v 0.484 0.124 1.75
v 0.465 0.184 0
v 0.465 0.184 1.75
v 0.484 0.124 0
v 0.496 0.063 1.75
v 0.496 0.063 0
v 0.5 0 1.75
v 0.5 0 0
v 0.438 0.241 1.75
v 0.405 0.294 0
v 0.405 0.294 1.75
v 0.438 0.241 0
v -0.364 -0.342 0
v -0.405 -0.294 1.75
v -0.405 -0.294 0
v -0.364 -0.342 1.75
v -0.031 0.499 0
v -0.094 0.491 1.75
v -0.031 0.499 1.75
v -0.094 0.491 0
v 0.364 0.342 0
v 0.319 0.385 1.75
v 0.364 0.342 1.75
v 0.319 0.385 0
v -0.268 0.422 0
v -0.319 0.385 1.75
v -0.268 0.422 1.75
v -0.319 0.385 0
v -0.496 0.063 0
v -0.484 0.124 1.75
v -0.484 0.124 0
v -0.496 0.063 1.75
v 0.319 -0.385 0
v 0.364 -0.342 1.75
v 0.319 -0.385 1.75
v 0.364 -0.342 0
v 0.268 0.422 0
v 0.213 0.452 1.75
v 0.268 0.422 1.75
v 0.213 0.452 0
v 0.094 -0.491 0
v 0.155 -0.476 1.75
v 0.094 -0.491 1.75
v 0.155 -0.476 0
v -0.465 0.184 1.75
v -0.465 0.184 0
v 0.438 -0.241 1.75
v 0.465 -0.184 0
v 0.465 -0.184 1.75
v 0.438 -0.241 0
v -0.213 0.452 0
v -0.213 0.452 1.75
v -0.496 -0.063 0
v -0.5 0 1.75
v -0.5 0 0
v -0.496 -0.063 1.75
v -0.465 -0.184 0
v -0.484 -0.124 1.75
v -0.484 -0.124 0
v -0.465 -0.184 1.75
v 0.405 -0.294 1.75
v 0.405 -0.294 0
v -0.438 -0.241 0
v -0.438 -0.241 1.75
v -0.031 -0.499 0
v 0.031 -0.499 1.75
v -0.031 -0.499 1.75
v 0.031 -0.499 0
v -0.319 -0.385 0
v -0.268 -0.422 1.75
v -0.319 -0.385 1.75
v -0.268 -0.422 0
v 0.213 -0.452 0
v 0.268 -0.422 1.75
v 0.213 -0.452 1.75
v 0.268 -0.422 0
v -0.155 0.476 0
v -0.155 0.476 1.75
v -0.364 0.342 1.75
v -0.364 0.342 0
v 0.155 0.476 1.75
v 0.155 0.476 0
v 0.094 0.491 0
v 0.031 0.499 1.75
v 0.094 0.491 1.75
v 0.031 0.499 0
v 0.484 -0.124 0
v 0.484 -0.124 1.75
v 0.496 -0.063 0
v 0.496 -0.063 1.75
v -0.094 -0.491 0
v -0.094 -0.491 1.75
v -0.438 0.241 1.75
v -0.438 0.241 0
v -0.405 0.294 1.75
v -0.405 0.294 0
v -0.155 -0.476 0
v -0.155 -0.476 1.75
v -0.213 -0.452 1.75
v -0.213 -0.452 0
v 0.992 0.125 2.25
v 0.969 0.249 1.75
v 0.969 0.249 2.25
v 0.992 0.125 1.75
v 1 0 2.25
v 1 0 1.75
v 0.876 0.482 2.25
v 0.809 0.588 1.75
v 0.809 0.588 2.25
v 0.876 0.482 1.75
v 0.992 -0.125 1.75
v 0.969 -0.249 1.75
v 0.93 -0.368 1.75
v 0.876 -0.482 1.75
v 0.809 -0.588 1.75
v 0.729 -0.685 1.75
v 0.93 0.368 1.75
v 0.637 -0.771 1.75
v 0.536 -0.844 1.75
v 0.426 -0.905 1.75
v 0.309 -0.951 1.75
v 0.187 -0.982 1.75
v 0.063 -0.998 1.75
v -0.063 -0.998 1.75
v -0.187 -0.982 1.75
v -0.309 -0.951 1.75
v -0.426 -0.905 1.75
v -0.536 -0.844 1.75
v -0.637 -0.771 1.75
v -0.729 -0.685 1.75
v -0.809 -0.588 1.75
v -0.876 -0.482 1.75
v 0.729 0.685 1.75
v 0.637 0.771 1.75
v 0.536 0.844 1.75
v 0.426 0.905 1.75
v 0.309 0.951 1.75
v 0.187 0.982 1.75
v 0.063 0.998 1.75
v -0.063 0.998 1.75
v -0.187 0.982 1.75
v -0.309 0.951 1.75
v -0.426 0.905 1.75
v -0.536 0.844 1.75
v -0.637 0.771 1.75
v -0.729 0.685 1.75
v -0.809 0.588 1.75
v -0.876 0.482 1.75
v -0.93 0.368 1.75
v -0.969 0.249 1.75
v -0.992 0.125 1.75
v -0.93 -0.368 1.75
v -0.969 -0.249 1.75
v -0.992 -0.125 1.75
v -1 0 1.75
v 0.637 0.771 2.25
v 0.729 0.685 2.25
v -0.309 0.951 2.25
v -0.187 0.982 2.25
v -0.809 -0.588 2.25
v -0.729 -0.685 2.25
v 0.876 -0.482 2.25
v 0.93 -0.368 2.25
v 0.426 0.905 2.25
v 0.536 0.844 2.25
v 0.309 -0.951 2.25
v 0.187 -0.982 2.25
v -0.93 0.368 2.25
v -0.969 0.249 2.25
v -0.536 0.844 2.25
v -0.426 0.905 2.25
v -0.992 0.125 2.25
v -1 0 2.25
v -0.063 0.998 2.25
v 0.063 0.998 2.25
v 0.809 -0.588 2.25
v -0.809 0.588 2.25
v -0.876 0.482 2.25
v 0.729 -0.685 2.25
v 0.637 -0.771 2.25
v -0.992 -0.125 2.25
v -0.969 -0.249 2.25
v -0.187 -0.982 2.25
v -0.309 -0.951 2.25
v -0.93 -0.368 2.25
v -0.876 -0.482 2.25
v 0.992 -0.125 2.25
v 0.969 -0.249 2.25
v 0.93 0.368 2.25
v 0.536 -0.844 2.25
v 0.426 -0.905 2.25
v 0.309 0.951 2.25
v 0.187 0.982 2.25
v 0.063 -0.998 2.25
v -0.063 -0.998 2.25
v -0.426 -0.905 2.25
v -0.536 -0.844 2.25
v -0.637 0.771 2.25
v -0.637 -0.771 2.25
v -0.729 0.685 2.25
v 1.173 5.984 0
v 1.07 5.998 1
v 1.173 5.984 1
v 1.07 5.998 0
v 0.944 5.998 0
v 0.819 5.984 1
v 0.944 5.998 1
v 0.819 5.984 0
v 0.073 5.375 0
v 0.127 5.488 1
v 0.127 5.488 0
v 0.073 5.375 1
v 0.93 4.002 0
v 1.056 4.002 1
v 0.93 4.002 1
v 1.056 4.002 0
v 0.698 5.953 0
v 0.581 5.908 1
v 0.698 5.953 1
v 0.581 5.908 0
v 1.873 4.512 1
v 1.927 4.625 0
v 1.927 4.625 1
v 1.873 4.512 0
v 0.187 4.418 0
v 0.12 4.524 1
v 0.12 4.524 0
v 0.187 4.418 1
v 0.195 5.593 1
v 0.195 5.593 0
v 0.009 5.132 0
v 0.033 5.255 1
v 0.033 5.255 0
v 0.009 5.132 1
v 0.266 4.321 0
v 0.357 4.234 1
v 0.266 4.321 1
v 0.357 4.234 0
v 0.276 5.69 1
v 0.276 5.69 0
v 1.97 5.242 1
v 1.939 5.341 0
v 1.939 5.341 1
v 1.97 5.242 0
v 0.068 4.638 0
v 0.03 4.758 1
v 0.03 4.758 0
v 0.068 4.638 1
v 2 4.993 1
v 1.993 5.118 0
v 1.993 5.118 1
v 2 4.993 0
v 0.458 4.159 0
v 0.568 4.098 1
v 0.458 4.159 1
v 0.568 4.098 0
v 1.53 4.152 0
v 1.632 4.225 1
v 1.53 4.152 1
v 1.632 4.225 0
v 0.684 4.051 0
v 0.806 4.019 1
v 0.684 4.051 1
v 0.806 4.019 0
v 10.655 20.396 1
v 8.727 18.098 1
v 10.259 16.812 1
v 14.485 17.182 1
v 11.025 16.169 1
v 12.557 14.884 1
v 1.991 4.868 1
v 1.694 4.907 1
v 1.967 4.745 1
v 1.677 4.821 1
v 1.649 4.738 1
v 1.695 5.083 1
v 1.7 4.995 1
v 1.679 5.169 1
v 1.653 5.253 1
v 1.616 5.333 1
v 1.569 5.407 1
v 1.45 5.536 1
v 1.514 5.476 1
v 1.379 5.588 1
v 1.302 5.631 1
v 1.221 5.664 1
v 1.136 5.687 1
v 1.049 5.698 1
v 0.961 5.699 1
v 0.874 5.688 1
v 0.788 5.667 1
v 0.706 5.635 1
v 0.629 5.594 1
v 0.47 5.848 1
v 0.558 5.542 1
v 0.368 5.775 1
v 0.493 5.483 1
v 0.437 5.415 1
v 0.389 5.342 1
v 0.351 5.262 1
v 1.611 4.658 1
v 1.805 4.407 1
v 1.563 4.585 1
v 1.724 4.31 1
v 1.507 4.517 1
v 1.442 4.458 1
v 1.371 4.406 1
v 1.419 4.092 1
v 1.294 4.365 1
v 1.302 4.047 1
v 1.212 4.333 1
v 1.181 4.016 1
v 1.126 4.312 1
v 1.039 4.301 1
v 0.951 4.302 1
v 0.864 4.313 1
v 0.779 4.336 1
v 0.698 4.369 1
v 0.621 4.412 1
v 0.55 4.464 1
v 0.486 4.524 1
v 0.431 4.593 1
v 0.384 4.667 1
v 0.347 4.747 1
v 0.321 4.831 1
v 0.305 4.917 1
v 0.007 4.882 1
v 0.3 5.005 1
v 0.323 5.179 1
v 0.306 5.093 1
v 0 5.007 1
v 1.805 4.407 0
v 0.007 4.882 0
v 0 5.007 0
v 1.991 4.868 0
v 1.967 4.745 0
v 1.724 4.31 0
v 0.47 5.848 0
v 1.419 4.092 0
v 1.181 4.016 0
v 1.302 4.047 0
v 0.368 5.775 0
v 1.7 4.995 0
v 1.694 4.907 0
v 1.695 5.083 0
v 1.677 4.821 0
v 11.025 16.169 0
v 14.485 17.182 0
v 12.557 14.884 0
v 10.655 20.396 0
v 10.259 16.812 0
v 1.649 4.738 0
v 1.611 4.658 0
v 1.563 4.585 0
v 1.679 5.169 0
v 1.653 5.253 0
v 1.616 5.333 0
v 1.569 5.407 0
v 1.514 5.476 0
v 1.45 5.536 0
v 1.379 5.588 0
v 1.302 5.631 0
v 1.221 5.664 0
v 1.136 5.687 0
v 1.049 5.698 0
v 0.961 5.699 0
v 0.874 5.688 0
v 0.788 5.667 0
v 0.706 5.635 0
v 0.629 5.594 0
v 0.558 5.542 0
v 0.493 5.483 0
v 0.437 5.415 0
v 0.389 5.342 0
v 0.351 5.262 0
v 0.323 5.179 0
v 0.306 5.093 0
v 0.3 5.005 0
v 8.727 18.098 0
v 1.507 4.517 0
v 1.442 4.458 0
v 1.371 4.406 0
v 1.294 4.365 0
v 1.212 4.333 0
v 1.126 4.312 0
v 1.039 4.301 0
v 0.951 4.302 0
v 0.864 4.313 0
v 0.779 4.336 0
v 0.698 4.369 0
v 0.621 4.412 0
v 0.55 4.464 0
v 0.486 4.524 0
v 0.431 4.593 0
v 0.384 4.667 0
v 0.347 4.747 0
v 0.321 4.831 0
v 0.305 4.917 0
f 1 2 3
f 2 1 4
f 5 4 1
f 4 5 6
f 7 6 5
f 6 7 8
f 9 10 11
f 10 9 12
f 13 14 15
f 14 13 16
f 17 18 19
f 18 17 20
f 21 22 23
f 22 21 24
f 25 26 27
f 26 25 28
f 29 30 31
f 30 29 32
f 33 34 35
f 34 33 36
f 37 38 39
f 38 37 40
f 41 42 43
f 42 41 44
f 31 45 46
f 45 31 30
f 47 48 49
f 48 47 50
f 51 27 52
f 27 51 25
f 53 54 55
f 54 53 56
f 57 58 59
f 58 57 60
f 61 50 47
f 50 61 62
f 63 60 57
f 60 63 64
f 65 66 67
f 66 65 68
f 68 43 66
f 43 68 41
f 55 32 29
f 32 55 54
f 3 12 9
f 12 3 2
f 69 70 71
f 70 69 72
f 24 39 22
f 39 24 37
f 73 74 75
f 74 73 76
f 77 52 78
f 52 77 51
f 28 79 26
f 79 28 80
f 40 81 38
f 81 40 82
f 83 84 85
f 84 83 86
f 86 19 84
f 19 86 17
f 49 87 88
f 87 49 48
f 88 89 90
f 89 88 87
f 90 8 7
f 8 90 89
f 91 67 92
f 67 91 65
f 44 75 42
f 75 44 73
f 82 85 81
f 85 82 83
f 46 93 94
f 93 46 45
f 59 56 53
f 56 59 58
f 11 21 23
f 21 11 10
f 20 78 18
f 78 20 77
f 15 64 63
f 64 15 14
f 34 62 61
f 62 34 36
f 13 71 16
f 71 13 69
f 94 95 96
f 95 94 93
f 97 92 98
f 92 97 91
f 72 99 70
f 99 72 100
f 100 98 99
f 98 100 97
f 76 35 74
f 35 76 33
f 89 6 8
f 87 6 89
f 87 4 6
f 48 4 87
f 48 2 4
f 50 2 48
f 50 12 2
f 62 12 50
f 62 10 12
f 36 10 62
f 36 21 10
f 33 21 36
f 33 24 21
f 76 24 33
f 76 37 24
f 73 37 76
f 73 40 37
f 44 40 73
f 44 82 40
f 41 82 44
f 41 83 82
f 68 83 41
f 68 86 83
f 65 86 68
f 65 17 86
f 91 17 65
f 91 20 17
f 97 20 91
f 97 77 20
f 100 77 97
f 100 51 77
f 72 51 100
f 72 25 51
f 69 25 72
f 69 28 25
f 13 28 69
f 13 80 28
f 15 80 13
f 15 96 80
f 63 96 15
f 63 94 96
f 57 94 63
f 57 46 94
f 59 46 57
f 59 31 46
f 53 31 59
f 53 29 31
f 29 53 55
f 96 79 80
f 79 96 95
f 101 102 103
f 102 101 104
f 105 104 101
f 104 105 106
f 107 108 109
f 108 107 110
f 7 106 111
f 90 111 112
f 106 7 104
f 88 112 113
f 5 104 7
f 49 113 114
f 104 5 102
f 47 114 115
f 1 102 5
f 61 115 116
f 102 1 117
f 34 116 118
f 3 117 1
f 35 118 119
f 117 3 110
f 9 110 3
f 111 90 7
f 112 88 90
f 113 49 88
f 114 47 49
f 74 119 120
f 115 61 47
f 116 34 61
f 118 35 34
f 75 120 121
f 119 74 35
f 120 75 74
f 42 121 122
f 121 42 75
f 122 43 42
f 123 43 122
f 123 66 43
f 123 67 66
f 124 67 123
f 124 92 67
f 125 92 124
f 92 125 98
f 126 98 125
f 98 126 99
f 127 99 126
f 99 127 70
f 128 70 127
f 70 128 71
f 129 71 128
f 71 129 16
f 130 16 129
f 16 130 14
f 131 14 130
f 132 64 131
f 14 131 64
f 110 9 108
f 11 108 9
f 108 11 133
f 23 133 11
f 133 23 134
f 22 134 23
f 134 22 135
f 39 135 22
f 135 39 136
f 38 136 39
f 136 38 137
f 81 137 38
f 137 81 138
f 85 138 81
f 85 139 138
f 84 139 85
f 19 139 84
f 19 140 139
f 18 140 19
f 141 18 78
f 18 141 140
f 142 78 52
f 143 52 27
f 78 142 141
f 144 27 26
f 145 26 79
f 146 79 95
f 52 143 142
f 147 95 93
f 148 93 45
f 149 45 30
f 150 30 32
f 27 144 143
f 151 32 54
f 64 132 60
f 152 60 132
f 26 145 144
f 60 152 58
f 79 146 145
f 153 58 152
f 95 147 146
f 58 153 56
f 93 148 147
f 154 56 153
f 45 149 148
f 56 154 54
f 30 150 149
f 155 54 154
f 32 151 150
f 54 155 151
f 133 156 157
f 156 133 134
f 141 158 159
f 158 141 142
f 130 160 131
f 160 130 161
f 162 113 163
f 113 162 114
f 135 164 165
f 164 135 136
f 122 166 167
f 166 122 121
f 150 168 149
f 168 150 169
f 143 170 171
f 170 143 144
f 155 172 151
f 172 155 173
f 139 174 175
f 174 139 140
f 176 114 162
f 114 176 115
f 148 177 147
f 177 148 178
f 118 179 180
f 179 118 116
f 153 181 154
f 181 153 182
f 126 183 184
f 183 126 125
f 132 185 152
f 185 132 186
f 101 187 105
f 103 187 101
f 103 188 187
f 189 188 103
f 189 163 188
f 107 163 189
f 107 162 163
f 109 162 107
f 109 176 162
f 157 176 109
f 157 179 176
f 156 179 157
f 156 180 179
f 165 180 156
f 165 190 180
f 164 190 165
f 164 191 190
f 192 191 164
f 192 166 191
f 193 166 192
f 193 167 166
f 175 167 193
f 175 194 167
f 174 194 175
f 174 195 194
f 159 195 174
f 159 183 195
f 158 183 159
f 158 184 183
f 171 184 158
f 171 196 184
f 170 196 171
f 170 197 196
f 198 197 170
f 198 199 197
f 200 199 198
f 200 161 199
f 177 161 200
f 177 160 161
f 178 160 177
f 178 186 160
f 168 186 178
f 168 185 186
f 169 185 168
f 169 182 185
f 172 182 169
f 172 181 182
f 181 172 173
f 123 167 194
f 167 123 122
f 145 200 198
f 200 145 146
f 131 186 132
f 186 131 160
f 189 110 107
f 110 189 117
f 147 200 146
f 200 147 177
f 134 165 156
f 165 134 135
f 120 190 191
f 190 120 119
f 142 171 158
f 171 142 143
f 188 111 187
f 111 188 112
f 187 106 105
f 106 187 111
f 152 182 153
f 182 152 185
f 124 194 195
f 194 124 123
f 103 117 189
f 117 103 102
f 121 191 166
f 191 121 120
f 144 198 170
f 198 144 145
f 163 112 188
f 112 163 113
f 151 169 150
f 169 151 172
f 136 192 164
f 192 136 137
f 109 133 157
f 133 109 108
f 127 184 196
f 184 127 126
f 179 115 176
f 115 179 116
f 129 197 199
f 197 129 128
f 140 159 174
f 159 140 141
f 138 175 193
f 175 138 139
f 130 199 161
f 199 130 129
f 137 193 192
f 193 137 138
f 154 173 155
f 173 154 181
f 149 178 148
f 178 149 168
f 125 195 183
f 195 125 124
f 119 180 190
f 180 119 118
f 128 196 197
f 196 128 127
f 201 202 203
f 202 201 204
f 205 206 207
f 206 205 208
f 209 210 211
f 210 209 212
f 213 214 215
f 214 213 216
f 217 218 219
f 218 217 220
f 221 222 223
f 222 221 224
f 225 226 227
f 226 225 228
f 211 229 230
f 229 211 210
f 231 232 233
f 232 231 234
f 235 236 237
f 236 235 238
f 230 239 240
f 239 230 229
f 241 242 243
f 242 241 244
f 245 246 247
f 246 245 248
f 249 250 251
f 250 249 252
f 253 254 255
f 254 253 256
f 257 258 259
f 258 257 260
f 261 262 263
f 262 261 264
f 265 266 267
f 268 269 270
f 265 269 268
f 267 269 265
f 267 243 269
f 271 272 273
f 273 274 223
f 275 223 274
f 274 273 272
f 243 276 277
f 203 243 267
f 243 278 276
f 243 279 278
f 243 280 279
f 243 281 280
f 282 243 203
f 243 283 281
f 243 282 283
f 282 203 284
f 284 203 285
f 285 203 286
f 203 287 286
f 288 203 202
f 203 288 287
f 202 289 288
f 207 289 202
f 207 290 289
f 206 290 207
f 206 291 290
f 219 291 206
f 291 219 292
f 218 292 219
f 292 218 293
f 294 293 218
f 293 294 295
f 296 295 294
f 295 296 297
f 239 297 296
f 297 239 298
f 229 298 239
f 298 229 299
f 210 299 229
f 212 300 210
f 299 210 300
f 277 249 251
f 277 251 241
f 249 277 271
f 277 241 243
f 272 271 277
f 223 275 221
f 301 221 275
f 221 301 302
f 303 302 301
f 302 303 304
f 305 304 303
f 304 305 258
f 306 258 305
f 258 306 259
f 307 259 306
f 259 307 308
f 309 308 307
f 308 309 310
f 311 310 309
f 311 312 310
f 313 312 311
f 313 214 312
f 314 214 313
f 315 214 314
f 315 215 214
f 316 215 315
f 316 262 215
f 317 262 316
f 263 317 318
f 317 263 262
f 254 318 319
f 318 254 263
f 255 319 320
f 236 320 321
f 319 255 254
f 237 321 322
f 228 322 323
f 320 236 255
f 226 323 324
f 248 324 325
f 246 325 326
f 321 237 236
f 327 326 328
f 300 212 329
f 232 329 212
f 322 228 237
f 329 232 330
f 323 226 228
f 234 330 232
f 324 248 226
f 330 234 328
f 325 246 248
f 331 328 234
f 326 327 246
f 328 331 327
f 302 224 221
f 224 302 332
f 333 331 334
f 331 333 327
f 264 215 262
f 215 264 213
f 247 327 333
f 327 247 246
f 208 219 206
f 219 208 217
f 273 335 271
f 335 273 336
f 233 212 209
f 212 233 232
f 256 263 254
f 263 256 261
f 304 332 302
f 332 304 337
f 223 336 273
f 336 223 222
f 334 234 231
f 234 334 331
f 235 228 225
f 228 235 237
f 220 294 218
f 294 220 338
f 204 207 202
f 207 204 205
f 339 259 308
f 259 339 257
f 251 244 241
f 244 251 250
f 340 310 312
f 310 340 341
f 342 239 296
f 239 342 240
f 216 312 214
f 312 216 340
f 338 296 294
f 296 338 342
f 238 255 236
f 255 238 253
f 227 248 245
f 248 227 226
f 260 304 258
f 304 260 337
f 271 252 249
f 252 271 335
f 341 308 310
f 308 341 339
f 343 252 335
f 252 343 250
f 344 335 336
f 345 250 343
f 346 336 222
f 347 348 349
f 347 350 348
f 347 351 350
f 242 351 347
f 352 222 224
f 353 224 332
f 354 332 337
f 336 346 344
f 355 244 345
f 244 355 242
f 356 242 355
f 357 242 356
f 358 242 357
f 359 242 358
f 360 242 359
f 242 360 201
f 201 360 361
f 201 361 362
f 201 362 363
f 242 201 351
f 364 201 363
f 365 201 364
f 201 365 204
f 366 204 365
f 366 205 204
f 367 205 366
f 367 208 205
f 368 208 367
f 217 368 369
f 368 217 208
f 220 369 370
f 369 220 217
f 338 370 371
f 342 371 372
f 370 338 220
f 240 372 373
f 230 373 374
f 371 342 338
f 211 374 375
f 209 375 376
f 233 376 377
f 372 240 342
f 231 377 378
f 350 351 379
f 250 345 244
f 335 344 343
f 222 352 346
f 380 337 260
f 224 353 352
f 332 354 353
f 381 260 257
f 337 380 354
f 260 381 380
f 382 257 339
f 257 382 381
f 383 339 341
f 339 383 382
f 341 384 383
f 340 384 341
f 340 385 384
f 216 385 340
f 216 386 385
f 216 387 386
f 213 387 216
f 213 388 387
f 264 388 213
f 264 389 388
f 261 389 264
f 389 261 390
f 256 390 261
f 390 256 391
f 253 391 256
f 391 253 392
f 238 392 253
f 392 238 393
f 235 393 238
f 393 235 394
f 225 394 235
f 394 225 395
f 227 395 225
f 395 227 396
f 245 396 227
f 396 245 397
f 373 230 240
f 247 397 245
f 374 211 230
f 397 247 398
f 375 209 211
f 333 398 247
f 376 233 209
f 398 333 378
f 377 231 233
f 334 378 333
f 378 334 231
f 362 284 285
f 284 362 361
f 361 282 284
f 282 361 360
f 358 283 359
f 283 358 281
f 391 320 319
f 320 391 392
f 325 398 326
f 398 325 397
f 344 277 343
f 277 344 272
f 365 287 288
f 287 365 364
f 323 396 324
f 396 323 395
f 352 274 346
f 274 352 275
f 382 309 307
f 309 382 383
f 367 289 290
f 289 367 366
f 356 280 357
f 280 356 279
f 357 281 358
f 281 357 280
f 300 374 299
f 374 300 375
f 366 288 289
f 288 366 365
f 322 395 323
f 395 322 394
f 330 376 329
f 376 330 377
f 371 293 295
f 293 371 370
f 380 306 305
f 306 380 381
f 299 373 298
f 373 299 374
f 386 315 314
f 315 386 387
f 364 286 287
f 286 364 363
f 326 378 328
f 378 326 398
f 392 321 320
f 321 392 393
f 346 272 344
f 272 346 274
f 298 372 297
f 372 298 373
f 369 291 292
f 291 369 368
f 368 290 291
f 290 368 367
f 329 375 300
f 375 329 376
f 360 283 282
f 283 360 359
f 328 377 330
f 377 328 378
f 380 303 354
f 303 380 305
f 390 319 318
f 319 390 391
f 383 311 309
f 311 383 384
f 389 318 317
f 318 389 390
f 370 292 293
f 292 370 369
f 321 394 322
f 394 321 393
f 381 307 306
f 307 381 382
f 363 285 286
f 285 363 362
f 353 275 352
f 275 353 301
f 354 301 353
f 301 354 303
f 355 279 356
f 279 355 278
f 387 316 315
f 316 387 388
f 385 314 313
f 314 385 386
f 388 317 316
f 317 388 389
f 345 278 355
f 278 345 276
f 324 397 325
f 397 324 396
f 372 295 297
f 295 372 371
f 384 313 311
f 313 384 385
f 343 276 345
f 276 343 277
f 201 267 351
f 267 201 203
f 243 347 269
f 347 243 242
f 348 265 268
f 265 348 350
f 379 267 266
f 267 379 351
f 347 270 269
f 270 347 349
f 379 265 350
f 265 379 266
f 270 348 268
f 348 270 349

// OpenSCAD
module base()
{
 	//cube([20, 10, 1]);
 	//translate([1,5,1])
 		cylinder(r=0.5, h=2, $fn=50, center=true);
		
	translate([0, 0, 1]) cylinder(r=1, h=0.5, $fn=50, center=true);

 }
 
module sway(){
 	difference(){
 		cylinder(r=1, h=1, $fn=50);
 		cylinder(r=0.7, h=2, $fn=50);
 	}
 	translate([0.7, -0.5, 0])
 		cube([15,1,1]);
 
 	translate([15,-2.5,0])
 		cube([3,5,1]);
 }
 
translate([0, 0, 1]) base();

translate([1,5,0])
 	rotate([0,0,50]) //can adjust
 	sway();
